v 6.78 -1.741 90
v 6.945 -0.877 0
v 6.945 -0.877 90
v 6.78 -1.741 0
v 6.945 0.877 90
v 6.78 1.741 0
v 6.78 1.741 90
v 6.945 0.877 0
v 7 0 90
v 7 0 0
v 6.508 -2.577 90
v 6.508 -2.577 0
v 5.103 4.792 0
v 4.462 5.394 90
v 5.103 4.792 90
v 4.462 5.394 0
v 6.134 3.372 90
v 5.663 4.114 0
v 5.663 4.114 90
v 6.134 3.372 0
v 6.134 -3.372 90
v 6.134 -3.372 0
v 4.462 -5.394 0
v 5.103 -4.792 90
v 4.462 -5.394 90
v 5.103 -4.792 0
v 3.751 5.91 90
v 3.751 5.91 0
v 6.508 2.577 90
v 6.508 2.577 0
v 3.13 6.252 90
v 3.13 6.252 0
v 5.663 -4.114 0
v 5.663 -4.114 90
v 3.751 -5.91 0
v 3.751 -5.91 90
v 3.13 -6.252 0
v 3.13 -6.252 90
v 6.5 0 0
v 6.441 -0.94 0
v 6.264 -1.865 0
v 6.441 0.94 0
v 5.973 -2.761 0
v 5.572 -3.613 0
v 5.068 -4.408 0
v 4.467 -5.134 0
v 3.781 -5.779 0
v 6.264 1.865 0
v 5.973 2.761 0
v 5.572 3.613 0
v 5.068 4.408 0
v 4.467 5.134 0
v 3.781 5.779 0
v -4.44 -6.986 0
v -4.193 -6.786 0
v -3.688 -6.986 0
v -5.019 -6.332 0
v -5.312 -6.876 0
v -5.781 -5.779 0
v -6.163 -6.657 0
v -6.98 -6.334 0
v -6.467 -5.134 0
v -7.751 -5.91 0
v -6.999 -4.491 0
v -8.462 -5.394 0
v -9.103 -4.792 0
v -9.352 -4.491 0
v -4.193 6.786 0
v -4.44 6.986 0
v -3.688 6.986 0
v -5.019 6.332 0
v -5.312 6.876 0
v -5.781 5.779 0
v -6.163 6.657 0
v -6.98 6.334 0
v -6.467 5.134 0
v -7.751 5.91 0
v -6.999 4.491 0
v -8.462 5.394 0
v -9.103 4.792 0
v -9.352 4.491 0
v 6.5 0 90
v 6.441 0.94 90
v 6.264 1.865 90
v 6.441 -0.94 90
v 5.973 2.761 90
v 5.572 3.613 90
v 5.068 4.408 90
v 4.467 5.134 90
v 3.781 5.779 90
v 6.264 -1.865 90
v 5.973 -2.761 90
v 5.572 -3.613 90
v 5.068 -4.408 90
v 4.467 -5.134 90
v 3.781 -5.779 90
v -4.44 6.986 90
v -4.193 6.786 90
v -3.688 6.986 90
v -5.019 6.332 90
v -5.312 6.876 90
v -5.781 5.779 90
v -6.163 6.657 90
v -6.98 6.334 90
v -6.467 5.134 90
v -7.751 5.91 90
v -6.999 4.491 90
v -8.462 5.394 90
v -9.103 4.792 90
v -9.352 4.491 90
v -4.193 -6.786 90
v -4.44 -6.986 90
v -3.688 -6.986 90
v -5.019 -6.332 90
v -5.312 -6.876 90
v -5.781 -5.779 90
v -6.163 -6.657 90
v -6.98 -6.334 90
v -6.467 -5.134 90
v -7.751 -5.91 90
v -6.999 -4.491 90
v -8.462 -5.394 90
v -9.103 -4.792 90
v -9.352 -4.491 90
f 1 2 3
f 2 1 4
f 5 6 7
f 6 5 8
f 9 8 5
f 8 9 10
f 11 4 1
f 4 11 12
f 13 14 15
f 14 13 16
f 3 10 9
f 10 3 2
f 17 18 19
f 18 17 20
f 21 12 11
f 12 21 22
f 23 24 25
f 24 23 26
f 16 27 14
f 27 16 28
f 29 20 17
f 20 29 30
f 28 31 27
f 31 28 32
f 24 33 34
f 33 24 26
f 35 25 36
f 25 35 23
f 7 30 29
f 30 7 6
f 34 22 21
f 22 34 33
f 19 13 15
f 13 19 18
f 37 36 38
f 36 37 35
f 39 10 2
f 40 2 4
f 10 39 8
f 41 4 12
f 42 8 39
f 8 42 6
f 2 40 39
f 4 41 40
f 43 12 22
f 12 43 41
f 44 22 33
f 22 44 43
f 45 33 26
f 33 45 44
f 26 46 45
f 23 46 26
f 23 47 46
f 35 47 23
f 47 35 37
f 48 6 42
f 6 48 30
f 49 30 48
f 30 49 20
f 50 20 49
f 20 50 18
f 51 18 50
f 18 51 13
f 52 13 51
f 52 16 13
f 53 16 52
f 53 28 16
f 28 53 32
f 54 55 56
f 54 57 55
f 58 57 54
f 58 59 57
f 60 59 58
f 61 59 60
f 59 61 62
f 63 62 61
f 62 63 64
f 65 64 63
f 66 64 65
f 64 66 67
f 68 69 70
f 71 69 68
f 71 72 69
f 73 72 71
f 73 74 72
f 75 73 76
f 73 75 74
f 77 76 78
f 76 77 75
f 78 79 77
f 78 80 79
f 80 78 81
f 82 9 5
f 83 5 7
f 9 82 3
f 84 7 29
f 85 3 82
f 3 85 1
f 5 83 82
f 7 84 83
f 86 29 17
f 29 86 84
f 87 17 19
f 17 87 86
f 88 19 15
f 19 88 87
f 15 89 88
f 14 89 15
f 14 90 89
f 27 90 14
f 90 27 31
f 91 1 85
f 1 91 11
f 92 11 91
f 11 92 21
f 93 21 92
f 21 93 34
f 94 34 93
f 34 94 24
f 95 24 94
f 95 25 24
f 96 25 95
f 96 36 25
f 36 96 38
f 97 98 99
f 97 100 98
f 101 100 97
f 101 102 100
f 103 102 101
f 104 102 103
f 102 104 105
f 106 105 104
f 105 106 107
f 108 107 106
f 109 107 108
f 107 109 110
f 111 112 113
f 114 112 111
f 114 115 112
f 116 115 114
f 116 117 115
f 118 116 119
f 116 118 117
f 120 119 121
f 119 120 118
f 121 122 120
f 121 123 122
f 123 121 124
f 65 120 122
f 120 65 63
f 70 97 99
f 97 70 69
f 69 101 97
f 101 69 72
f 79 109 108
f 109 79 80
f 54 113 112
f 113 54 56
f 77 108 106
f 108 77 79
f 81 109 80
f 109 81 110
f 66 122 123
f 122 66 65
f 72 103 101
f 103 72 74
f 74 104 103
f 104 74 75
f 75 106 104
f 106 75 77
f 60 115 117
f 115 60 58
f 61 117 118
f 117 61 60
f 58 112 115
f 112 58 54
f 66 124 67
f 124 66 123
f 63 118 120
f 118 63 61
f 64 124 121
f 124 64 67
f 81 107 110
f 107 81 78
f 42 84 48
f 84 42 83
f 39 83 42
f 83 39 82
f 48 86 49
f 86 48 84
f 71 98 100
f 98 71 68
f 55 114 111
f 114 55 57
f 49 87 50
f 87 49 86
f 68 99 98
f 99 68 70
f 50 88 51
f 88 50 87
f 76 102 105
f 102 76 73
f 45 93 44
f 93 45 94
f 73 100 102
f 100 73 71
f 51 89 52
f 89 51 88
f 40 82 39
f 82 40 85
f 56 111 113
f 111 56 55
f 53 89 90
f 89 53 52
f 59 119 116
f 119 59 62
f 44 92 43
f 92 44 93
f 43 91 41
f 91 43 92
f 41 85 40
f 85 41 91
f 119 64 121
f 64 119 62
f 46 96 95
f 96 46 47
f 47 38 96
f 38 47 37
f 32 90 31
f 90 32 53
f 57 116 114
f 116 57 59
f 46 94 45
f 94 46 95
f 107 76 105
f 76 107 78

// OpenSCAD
$fn = 50;


difference() {
	union() {
		cylinder(h = 90, r = 7.0000000000);
		translate(v = [-4.0000000000, 0, 0]) {
			cylinder(h = 90, r = 7.0000000000);
		}
	}
	union() {
		cylinder(h = 90, r = 3.2500000000);
		cylinder(h = 90, r = 1.8000000000);
		cylinder(h = 90, r = 1.8000000000);
		cylinder(h = 90, r = 1.8000000000);
		translate(v = [-8.5000000000, 0, 0]) {
			hull() {
				translate(v = [-3.7500000000, 0.0000000000, 0]) {
					cylinder(h = 90, r = 4.5000000000);
				}
				translate(v = [3.7500000000, 0.0000000000, 0]) {
					cylinder(h = 90, r = 4.5000000000);
				}
				translate(v = [-3.7500000000, -0.0000000000, 0]) {
					cylinder(h = 90, r = 4.5000000000);
				}
				translate(v = [3.7500000000, -0.0000000000, 0]) {
					cylinder(h = 90, r = 4.5000000000);
				}
			}
		}
		translate(v = [-1.0000000000, 0, 0.0000000000]) {
			cylinder(h = 90, r = 7.5000000000);
		}
	}
}
